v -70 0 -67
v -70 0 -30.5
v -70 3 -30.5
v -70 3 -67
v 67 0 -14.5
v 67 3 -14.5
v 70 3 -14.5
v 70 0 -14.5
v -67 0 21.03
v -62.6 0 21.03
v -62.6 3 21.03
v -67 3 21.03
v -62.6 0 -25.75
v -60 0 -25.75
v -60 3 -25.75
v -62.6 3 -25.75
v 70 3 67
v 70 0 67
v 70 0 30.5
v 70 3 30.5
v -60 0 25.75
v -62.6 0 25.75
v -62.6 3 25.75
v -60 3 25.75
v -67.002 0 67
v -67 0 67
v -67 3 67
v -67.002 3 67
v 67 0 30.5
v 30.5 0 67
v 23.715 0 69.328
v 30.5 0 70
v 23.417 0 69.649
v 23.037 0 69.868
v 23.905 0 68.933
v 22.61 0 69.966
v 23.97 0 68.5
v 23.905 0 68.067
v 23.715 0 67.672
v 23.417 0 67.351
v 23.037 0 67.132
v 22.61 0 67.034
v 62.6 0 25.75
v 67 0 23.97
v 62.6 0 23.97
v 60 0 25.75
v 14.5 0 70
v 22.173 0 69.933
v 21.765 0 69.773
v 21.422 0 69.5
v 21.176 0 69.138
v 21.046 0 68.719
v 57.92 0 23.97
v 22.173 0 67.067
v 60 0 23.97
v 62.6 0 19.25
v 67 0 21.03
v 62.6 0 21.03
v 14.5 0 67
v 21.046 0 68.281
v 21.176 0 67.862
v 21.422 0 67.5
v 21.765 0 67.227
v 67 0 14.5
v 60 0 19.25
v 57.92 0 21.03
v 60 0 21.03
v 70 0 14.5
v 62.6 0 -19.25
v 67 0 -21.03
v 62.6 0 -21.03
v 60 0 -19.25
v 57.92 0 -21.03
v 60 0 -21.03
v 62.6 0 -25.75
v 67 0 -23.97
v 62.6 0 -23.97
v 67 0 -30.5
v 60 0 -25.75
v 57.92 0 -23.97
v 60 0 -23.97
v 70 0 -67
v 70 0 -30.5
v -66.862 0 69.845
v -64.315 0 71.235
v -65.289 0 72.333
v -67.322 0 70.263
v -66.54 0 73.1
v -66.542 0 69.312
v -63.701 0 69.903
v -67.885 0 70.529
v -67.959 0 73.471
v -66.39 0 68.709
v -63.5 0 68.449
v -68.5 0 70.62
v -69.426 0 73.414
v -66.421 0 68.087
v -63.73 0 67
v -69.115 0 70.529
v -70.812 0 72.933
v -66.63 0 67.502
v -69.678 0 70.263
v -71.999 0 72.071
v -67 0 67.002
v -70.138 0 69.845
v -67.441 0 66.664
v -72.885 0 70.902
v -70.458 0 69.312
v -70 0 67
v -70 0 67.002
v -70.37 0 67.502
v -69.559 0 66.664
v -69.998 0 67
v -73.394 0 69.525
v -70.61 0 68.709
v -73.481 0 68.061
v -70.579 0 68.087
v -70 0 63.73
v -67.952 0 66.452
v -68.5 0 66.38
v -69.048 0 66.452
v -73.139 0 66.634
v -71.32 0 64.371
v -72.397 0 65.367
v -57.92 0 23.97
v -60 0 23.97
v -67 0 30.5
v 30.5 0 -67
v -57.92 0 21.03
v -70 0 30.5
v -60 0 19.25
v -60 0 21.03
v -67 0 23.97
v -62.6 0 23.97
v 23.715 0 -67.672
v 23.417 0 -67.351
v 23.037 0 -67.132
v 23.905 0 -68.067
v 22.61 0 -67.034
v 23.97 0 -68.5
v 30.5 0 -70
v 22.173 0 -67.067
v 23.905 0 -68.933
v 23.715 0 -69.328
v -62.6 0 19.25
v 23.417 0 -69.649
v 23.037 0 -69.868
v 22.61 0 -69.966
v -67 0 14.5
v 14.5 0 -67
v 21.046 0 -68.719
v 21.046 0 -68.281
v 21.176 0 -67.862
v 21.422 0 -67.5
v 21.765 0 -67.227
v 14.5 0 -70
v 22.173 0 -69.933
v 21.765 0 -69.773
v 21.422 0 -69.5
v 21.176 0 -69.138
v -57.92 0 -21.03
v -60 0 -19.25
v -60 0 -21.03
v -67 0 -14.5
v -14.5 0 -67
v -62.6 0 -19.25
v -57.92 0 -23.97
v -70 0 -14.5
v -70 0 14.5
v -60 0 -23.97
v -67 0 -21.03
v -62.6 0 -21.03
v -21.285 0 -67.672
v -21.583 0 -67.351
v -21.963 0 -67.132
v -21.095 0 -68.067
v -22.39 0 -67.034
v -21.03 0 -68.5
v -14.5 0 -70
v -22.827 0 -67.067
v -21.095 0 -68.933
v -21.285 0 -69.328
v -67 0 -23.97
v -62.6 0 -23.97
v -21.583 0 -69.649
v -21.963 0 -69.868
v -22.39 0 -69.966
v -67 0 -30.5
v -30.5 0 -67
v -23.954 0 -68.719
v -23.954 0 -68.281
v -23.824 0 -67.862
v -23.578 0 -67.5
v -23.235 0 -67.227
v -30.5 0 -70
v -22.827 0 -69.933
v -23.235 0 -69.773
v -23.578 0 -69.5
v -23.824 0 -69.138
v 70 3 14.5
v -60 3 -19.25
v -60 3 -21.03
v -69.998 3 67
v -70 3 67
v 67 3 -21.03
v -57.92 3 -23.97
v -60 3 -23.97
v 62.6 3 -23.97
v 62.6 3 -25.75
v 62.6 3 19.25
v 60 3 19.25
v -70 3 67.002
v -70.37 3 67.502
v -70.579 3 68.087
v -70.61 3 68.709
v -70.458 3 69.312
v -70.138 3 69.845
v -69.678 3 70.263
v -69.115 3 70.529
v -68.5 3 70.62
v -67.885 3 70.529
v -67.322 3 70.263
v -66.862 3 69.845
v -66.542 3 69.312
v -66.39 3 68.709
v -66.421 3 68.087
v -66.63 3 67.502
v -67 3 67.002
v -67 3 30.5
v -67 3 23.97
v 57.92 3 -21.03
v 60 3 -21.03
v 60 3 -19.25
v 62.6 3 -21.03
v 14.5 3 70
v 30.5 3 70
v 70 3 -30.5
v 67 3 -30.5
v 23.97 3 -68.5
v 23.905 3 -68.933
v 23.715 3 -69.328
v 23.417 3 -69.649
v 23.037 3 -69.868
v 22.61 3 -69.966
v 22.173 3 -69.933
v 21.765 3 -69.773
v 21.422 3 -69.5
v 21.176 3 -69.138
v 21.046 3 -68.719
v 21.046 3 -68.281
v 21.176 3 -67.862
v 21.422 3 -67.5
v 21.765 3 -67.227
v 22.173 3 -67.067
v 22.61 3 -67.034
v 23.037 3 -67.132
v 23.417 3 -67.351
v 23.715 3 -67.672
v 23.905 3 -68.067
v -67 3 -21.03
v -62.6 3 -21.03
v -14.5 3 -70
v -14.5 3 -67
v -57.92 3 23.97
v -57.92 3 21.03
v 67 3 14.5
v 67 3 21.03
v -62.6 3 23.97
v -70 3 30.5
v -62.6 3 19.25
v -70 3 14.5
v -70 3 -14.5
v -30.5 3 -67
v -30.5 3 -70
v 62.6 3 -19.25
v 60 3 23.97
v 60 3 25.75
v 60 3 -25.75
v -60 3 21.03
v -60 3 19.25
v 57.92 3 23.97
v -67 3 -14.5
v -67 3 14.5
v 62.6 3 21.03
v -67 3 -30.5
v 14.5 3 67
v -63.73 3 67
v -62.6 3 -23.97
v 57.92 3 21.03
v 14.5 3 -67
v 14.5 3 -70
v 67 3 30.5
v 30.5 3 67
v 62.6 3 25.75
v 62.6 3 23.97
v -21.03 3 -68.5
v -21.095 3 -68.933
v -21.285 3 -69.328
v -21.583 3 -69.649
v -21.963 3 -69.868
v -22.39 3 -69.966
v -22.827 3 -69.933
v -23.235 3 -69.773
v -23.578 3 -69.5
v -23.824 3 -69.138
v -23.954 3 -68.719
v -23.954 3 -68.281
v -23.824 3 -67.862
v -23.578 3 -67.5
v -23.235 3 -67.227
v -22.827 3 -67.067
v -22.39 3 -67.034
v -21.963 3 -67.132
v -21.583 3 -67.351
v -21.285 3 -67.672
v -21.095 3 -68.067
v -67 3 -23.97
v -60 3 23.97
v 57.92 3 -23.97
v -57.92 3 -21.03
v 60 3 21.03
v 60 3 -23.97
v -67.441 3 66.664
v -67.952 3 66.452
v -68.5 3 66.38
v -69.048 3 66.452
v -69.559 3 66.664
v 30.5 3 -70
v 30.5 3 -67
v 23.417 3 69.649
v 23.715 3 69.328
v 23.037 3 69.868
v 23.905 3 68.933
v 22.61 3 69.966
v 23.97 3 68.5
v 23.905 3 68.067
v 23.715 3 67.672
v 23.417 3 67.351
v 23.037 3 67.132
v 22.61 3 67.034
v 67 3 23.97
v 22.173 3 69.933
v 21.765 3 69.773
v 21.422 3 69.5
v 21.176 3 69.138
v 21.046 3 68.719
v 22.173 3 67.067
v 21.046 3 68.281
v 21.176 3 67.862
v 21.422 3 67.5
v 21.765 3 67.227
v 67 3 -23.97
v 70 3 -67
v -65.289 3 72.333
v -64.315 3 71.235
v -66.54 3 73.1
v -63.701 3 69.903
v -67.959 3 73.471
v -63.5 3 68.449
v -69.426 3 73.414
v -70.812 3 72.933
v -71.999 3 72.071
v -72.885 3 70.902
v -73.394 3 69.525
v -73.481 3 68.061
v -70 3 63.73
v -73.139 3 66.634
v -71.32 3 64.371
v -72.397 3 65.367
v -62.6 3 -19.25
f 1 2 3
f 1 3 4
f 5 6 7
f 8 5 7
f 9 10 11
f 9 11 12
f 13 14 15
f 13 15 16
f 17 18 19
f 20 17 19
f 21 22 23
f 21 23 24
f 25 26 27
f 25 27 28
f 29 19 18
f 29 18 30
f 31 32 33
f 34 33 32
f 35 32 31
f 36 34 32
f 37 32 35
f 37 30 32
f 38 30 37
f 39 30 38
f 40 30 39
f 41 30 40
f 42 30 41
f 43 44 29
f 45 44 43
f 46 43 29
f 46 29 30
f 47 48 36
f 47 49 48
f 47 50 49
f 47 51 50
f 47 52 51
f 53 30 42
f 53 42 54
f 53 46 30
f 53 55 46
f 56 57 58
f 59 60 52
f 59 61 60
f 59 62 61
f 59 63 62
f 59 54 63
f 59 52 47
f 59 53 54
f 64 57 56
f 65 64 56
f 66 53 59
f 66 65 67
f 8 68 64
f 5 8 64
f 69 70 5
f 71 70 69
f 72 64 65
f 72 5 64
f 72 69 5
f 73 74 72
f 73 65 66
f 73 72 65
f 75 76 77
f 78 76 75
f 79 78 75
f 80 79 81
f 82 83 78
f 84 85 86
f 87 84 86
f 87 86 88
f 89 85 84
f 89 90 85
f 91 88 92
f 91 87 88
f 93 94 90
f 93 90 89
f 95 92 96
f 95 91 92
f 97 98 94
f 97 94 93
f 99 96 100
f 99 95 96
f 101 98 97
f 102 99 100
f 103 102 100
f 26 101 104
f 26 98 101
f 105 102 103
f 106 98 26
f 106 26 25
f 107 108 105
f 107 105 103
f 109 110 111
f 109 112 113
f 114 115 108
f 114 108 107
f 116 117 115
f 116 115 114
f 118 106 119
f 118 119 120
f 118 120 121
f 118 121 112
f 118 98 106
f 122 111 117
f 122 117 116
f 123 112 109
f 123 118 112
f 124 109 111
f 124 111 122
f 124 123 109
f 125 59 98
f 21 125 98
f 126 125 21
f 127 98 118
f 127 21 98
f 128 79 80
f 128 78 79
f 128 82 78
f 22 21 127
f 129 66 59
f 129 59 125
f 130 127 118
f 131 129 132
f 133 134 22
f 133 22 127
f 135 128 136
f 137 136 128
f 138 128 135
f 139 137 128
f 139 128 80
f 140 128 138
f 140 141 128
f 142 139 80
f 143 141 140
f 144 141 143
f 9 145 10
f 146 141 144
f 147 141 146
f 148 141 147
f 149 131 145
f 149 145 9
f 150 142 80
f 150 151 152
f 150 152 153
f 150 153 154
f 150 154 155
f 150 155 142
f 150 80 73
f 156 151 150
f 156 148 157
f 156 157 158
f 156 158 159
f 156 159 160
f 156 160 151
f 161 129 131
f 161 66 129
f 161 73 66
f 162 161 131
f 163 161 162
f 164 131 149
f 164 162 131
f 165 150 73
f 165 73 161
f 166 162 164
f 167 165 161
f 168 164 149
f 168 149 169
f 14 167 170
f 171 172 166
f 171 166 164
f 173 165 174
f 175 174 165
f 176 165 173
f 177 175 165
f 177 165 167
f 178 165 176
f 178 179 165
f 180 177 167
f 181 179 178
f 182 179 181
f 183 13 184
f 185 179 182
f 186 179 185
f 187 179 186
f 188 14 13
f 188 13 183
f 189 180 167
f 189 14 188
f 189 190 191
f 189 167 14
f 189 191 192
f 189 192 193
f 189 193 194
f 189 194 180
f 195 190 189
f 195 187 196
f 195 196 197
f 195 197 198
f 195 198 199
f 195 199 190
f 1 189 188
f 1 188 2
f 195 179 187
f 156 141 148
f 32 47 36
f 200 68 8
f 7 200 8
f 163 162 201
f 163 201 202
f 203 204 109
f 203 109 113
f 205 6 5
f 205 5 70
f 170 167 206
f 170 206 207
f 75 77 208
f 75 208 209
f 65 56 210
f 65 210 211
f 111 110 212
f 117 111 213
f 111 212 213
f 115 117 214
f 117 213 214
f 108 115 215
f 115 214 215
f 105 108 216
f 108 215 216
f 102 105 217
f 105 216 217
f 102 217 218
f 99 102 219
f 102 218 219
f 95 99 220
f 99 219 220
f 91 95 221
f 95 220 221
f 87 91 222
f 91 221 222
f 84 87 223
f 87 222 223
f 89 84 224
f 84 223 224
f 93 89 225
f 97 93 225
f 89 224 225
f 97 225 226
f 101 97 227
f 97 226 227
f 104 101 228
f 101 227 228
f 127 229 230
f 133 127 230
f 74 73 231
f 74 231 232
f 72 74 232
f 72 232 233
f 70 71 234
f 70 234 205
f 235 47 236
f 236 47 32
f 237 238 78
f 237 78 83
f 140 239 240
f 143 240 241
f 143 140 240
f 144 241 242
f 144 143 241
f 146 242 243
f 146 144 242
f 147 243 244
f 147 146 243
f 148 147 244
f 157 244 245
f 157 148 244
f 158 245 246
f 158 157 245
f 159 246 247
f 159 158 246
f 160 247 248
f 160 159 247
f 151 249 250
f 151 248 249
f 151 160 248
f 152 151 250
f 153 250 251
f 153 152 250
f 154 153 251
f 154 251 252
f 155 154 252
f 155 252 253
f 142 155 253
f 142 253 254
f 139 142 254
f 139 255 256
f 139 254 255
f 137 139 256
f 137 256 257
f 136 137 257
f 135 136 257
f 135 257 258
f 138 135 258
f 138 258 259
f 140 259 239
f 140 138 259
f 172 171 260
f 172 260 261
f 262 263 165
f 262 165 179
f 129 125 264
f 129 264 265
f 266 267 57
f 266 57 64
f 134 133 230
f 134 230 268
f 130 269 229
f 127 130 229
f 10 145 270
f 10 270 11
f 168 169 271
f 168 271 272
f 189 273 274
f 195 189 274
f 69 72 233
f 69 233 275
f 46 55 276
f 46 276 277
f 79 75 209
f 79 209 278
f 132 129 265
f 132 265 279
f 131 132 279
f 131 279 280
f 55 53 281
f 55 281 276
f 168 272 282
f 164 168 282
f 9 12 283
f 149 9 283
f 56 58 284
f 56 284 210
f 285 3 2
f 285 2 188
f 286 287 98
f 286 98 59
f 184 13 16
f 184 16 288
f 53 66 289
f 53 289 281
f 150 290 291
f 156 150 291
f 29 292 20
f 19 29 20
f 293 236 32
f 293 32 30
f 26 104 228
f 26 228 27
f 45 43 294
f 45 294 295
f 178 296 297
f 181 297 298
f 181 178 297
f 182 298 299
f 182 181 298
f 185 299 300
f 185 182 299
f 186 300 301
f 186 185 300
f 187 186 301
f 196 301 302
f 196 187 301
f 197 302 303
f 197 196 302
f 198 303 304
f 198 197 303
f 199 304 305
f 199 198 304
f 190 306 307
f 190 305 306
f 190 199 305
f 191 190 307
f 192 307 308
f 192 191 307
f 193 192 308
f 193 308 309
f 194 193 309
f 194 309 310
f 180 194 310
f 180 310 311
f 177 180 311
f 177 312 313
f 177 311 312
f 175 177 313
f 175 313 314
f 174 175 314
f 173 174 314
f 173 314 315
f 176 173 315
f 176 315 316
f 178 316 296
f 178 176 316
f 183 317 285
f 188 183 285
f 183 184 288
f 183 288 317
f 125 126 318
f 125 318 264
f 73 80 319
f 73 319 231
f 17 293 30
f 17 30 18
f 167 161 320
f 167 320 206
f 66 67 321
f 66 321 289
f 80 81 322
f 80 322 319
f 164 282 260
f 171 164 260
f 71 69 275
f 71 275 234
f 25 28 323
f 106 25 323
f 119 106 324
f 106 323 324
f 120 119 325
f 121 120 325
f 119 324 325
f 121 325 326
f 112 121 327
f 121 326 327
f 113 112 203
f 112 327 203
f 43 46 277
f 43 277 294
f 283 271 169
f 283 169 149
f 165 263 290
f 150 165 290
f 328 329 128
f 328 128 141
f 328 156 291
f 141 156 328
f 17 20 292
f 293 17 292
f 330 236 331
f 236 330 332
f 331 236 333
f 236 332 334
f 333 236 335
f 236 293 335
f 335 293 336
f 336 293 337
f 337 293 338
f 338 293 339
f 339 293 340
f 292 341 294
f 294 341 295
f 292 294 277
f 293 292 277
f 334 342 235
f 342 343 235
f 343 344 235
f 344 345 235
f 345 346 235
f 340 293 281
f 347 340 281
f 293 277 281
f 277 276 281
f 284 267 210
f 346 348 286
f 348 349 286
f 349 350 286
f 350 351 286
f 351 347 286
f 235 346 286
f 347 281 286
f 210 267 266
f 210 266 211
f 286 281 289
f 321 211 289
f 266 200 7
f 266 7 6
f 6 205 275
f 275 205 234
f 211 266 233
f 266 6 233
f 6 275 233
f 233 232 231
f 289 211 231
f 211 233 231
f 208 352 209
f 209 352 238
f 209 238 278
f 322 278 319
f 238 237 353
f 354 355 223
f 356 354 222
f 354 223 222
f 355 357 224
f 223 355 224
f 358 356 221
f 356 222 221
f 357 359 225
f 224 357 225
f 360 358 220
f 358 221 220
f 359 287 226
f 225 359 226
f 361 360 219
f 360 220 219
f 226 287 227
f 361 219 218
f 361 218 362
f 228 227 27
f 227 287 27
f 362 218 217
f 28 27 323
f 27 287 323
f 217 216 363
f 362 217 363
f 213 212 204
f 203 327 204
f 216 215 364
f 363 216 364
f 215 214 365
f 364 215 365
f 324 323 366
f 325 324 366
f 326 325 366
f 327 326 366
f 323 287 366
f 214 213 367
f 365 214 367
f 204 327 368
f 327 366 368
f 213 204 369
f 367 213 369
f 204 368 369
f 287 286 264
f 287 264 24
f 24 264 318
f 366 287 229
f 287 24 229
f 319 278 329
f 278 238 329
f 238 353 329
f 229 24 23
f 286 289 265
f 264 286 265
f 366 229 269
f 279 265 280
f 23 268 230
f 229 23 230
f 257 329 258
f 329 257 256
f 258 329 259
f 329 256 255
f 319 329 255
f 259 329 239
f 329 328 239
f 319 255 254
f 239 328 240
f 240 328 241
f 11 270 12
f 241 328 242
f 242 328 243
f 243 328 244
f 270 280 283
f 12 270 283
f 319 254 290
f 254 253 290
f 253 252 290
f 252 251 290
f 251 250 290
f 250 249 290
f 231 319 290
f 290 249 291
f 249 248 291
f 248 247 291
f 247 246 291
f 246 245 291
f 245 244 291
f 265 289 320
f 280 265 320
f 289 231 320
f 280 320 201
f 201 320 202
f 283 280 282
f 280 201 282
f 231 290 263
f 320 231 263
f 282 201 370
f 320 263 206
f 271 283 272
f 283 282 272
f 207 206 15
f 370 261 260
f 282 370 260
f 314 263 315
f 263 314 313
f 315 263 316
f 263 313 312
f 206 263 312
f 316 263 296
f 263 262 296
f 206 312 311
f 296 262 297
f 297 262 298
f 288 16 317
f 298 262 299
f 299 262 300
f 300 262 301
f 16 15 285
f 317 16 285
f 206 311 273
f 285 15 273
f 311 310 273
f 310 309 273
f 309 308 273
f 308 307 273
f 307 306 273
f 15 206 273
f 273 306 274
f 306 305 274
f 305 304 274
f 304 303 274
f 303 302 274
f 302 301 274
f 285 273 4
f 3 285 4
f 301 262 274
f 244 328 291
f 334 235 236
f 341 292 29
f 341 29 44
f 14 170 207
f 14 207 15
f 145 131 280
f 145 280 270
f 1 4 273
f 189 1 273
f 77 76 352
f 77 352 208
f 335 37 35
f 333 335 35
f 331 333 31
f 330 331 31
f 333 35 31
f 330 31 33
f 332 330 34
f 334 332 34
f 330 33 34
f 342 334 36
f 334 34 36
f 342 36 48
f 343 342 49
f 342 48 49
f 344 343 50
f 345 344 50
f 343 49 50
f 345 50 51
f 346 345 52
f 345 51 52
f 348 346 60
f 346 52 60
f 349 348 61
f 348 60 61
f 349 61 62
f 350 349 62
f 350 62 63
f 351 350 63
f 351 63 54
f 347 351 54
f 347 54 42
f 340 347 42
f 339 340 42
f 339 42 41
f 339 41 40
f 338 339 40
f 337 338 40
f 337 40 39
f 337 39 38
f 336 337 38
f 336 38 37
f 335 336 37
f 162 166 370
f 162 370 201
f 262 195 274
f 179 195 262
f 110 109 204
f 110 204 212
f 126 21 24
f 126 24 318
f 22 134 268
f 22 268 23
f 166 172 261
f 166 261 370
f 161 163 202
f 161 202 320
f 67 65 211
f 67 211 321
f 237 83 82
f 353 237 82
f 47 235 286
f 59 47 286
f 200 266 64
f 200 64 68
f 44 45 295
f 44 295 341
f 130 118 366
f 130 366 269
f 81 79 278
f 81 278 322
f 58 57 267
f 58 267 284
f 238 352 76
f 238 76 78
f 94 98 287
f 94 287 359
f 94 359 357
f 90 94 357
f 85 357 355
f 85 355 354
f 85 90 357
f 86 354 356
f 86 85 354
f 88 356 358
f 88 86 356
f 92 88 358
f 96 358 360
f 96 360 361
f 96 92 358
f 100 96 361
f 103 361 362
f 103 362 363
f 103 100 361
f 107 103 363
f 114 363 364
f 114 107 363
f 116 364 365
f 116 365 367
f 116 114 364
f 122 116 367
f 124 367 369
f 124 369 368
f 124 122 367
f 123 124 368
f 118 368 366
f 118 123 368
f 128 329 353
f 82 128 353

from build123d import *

# Parameters (mm, degrees)
SKETCH1_W           = 140
SKETCH1_H           = 140
BOSS_EXTRUDE1_DEPTH = 3
SKETCH2_W           = 39.5
SKETCH2_H           = 3
SKETCH2_W_2         = 29
CUT_EXTRUDE2_DEPTH  = 3
SKETCH4_W           = 3
SKETCH4_H           = 16
CUT_EXTRUDE3_DEPTH  = 3
SKETCH6_R           = 1.47
CUT_EXTRUDE4_DEPTH  = 4
CUT_EXTRUDE5_DEPTH  = 3
SKETCH8_W           = 16
SKETCH8_H           = 3
CUT_EXTRUDE6_DEPTH  = 3
SKETCH9_R           = 5
BOSS_EXTRUDE3_DEPTH = 3
SKETCH10_R          = 2.12
CUT_EXTRUDE7_DEPTH  = 3


with BuildPart() as part:
    # Sketch1 → Boss-Extrude1 (new body)
    with BuildSketch(Plane(origin=(0, 0, 0), x_dir=(1, 0, 0), z_dir=(0, 1, 0))):
        Rectangle(SKETCH1_W, SKETCH1_H)
    extrude(amount=BOSS_EXTRUDE1_DEPTH)

    # Sketch2 → Cut-Extrude2 (cut)
    with BuildSketch(Plane(origin=(0, 3, 0), x_dir=(1, 0, 0), z_dir=(0, 1, 0))):
        with Locations((-50.25, 68.5)):
            Rectangle(SKETCH2_W, SKETCH2_H)
        with Locations((-50.25, -68.5)):
            Rectangle(SKETCH2_W, SKETCH2_H)
        with Locations((50.25, -68.5)):
            Rectangle(SKETCH2_W, SKETCH2_H)
        with Locations((50.25, 68.5)):
            Rectangle(SKETCH2_W, SKETCH2_H)
        with Locations((0, 68.5)):
            Rectangle(SKETCH2_W_2, SKETCH2_H)
        with Locations((0, -68.5)):
            Rectangle(SKETCH2_W_2, SKETCH2_H)
    extrude(amount=-CUT_EXTRUDE2_DEPTH, mode=Mode.SUBTRACT)

    # Sketch4 → Cut-Extrude3 (cut)
    with BuildSketch(Plane(origin=(0, 3, 0), x_dir=(1, 0, 0), z_dir=(0, 1, 0))):
        with Locations((-68.5, 22.5)):
            Rectangle(SKETCH4_W, SKETCH4_H)
        with Locations((-68.5, -22.5)):
            Rectangle(SKETCH4_W, SKETCH4_H)
        with Locations((68.5, 22.5)):
            Rectangle(SKETCH4_W, SKETCH4_H)
        with Locations((68.5, -22.5)):
            Rectangle(SKETCH4_W, SKETCH4_H)
    extrude(amount=-CUT_EXTRUDE3_DEPTH, mode=Mode.SUBTRACT)

    # Sketch6 → Cut-Extrude4 (cut, through all)
    with BuildSketch(Plane.XZ):
        with Locations((-22.5, 68.5)):
            Circle(SKETCH6_R)
        with Locations((22.5, 68.5)):
            Circle(SKETCH6_R)
    cut_extrude4 = extrude(amount=-CUT_EXTRUDE4_DEPTH, mode=Mode.SUBTRACT)

    # Mirror1: Cut-Extrude4 across plane
    add(cut_extrude4.mirror(Plane.XY), mode=Mode.SUBTRACT)

    # Sketch7 → Cut-Extrude5 (cut)
    with BuildSketch(Plane(origin=(0, 0, 0), x_dir=(-1, 0, 0), z_dir=(0, -1, 0))):
        Polygon((67, -23.97), (62.6, -23.97), (62.6, -25.75), (60, -25.75), (60, -23.97), (57.92, -23.97), (57.92, -21.03), (60, -21.03), (60, -19.25), (62.6, -19.25), (62.6, -21.03), (67, -21.03), align=None)
        Polygon((-67, -23.97), (-67, -21.03), (-62.6, -21.03), (-62.6, -19.25), (-60, -19.25), (-60, -21.03), (-57.92, -21.03), (-57.92, -23.97), (-60, -23.97), (-60, -25.75), (-62.6, -25.75), (-62.6, -23.97), align=None)
        Polygon((-67, 23.97), (-62.6, 23.97), (-62.6, 25.75), (-60, 25.75), (-60, 23.97), (-57.92, 23.97), (-57.92, 21.03), (-60, 21.03), (-60, 19.25), (-62.6, 19.25), (-62.6, 21.03), (-67, 21.03), align=None)
        Polygon((67, 23.97), (67, 21.03), (62.6, 21.03), (62.6, 19.25), (60, 19.25), (60, 21.03), (57.92, 21.03), (57.92, 23.97), (60, 23.97), (60, 25.75), (62.6, 25.75), (62.6, 23.97), align=None)
    extrude(amount=-CUT_EXTRUDE5_DEPTH, mode=Mode.SUBTRACT)

    # Sketch8 → Cut-Extrude6 (cut)
    with BuildSketch(Plane(origin=(0, 0, 0), x_dir=(-1, 0, 0), z_dir=(0, -1, 0))):
        with Locations((22.5, -68.5)):
            Rectangle(SKETCH8_W, SKETCH8_H)
    extrude(amount=-CUT_EXTRUDE6_DEPTH, mode=Mode.SUBTRACT)

    # Sketch9 → Boss-Extrude3 (add)
    with BuildSketch(Plane(origin=(0, 0, 0), x_dir=(-1, 0, 0), z_dir=(0, -1, 0))):
        with Locations((68.5, -68.5)):
            Circle(SKETCH9_R)
        with BuildLine():
            ThreePointArc((67.00186783, -67), (67.000933624, -67.000933624), (67, -67.00186783))
            Line((67, -67.00186783), (67, -67))
            Line((67, -67), (67.00186783, -67))
        make_face(mode=Mode.SUBTRACT)
        with BuildLine():
            ThreePointArc((67.00186783, -67), (68.5, -66.38), (69.99813217, -67))
            Line((69.99813217, -67), (67.00186783, -67))
        make_face(mode=Mode.SUBTRACT)
        with BuildLine():
            Line((69.99813217, -67), (70, -67))
            Line((70, -67), (70, -67.00186783))
            ThreePointArc((70, -67.00186783), (69.999066376, -67.000933624), (69.99813217, -67))
        make_face(mode=Mode.SUBTRACT)
    extrude(amount=-BOSS_EXTRUDE3_DEPTH)

    # Sketch10 → Cut-Extrude7 (cut)
    with BuildSketch(Plane(origin=(0, 3, 0), x_dir=(1, 0, 0), z_dir=(0, 1, 0))):
        with Locations((-68.5, -68.5)):
            Circle(SKETCH10_R)
    extrude(amount=-CUT_EXTRUDE7_DEPTH, mode=Mode.SUBTRACT)


solid = part.part
